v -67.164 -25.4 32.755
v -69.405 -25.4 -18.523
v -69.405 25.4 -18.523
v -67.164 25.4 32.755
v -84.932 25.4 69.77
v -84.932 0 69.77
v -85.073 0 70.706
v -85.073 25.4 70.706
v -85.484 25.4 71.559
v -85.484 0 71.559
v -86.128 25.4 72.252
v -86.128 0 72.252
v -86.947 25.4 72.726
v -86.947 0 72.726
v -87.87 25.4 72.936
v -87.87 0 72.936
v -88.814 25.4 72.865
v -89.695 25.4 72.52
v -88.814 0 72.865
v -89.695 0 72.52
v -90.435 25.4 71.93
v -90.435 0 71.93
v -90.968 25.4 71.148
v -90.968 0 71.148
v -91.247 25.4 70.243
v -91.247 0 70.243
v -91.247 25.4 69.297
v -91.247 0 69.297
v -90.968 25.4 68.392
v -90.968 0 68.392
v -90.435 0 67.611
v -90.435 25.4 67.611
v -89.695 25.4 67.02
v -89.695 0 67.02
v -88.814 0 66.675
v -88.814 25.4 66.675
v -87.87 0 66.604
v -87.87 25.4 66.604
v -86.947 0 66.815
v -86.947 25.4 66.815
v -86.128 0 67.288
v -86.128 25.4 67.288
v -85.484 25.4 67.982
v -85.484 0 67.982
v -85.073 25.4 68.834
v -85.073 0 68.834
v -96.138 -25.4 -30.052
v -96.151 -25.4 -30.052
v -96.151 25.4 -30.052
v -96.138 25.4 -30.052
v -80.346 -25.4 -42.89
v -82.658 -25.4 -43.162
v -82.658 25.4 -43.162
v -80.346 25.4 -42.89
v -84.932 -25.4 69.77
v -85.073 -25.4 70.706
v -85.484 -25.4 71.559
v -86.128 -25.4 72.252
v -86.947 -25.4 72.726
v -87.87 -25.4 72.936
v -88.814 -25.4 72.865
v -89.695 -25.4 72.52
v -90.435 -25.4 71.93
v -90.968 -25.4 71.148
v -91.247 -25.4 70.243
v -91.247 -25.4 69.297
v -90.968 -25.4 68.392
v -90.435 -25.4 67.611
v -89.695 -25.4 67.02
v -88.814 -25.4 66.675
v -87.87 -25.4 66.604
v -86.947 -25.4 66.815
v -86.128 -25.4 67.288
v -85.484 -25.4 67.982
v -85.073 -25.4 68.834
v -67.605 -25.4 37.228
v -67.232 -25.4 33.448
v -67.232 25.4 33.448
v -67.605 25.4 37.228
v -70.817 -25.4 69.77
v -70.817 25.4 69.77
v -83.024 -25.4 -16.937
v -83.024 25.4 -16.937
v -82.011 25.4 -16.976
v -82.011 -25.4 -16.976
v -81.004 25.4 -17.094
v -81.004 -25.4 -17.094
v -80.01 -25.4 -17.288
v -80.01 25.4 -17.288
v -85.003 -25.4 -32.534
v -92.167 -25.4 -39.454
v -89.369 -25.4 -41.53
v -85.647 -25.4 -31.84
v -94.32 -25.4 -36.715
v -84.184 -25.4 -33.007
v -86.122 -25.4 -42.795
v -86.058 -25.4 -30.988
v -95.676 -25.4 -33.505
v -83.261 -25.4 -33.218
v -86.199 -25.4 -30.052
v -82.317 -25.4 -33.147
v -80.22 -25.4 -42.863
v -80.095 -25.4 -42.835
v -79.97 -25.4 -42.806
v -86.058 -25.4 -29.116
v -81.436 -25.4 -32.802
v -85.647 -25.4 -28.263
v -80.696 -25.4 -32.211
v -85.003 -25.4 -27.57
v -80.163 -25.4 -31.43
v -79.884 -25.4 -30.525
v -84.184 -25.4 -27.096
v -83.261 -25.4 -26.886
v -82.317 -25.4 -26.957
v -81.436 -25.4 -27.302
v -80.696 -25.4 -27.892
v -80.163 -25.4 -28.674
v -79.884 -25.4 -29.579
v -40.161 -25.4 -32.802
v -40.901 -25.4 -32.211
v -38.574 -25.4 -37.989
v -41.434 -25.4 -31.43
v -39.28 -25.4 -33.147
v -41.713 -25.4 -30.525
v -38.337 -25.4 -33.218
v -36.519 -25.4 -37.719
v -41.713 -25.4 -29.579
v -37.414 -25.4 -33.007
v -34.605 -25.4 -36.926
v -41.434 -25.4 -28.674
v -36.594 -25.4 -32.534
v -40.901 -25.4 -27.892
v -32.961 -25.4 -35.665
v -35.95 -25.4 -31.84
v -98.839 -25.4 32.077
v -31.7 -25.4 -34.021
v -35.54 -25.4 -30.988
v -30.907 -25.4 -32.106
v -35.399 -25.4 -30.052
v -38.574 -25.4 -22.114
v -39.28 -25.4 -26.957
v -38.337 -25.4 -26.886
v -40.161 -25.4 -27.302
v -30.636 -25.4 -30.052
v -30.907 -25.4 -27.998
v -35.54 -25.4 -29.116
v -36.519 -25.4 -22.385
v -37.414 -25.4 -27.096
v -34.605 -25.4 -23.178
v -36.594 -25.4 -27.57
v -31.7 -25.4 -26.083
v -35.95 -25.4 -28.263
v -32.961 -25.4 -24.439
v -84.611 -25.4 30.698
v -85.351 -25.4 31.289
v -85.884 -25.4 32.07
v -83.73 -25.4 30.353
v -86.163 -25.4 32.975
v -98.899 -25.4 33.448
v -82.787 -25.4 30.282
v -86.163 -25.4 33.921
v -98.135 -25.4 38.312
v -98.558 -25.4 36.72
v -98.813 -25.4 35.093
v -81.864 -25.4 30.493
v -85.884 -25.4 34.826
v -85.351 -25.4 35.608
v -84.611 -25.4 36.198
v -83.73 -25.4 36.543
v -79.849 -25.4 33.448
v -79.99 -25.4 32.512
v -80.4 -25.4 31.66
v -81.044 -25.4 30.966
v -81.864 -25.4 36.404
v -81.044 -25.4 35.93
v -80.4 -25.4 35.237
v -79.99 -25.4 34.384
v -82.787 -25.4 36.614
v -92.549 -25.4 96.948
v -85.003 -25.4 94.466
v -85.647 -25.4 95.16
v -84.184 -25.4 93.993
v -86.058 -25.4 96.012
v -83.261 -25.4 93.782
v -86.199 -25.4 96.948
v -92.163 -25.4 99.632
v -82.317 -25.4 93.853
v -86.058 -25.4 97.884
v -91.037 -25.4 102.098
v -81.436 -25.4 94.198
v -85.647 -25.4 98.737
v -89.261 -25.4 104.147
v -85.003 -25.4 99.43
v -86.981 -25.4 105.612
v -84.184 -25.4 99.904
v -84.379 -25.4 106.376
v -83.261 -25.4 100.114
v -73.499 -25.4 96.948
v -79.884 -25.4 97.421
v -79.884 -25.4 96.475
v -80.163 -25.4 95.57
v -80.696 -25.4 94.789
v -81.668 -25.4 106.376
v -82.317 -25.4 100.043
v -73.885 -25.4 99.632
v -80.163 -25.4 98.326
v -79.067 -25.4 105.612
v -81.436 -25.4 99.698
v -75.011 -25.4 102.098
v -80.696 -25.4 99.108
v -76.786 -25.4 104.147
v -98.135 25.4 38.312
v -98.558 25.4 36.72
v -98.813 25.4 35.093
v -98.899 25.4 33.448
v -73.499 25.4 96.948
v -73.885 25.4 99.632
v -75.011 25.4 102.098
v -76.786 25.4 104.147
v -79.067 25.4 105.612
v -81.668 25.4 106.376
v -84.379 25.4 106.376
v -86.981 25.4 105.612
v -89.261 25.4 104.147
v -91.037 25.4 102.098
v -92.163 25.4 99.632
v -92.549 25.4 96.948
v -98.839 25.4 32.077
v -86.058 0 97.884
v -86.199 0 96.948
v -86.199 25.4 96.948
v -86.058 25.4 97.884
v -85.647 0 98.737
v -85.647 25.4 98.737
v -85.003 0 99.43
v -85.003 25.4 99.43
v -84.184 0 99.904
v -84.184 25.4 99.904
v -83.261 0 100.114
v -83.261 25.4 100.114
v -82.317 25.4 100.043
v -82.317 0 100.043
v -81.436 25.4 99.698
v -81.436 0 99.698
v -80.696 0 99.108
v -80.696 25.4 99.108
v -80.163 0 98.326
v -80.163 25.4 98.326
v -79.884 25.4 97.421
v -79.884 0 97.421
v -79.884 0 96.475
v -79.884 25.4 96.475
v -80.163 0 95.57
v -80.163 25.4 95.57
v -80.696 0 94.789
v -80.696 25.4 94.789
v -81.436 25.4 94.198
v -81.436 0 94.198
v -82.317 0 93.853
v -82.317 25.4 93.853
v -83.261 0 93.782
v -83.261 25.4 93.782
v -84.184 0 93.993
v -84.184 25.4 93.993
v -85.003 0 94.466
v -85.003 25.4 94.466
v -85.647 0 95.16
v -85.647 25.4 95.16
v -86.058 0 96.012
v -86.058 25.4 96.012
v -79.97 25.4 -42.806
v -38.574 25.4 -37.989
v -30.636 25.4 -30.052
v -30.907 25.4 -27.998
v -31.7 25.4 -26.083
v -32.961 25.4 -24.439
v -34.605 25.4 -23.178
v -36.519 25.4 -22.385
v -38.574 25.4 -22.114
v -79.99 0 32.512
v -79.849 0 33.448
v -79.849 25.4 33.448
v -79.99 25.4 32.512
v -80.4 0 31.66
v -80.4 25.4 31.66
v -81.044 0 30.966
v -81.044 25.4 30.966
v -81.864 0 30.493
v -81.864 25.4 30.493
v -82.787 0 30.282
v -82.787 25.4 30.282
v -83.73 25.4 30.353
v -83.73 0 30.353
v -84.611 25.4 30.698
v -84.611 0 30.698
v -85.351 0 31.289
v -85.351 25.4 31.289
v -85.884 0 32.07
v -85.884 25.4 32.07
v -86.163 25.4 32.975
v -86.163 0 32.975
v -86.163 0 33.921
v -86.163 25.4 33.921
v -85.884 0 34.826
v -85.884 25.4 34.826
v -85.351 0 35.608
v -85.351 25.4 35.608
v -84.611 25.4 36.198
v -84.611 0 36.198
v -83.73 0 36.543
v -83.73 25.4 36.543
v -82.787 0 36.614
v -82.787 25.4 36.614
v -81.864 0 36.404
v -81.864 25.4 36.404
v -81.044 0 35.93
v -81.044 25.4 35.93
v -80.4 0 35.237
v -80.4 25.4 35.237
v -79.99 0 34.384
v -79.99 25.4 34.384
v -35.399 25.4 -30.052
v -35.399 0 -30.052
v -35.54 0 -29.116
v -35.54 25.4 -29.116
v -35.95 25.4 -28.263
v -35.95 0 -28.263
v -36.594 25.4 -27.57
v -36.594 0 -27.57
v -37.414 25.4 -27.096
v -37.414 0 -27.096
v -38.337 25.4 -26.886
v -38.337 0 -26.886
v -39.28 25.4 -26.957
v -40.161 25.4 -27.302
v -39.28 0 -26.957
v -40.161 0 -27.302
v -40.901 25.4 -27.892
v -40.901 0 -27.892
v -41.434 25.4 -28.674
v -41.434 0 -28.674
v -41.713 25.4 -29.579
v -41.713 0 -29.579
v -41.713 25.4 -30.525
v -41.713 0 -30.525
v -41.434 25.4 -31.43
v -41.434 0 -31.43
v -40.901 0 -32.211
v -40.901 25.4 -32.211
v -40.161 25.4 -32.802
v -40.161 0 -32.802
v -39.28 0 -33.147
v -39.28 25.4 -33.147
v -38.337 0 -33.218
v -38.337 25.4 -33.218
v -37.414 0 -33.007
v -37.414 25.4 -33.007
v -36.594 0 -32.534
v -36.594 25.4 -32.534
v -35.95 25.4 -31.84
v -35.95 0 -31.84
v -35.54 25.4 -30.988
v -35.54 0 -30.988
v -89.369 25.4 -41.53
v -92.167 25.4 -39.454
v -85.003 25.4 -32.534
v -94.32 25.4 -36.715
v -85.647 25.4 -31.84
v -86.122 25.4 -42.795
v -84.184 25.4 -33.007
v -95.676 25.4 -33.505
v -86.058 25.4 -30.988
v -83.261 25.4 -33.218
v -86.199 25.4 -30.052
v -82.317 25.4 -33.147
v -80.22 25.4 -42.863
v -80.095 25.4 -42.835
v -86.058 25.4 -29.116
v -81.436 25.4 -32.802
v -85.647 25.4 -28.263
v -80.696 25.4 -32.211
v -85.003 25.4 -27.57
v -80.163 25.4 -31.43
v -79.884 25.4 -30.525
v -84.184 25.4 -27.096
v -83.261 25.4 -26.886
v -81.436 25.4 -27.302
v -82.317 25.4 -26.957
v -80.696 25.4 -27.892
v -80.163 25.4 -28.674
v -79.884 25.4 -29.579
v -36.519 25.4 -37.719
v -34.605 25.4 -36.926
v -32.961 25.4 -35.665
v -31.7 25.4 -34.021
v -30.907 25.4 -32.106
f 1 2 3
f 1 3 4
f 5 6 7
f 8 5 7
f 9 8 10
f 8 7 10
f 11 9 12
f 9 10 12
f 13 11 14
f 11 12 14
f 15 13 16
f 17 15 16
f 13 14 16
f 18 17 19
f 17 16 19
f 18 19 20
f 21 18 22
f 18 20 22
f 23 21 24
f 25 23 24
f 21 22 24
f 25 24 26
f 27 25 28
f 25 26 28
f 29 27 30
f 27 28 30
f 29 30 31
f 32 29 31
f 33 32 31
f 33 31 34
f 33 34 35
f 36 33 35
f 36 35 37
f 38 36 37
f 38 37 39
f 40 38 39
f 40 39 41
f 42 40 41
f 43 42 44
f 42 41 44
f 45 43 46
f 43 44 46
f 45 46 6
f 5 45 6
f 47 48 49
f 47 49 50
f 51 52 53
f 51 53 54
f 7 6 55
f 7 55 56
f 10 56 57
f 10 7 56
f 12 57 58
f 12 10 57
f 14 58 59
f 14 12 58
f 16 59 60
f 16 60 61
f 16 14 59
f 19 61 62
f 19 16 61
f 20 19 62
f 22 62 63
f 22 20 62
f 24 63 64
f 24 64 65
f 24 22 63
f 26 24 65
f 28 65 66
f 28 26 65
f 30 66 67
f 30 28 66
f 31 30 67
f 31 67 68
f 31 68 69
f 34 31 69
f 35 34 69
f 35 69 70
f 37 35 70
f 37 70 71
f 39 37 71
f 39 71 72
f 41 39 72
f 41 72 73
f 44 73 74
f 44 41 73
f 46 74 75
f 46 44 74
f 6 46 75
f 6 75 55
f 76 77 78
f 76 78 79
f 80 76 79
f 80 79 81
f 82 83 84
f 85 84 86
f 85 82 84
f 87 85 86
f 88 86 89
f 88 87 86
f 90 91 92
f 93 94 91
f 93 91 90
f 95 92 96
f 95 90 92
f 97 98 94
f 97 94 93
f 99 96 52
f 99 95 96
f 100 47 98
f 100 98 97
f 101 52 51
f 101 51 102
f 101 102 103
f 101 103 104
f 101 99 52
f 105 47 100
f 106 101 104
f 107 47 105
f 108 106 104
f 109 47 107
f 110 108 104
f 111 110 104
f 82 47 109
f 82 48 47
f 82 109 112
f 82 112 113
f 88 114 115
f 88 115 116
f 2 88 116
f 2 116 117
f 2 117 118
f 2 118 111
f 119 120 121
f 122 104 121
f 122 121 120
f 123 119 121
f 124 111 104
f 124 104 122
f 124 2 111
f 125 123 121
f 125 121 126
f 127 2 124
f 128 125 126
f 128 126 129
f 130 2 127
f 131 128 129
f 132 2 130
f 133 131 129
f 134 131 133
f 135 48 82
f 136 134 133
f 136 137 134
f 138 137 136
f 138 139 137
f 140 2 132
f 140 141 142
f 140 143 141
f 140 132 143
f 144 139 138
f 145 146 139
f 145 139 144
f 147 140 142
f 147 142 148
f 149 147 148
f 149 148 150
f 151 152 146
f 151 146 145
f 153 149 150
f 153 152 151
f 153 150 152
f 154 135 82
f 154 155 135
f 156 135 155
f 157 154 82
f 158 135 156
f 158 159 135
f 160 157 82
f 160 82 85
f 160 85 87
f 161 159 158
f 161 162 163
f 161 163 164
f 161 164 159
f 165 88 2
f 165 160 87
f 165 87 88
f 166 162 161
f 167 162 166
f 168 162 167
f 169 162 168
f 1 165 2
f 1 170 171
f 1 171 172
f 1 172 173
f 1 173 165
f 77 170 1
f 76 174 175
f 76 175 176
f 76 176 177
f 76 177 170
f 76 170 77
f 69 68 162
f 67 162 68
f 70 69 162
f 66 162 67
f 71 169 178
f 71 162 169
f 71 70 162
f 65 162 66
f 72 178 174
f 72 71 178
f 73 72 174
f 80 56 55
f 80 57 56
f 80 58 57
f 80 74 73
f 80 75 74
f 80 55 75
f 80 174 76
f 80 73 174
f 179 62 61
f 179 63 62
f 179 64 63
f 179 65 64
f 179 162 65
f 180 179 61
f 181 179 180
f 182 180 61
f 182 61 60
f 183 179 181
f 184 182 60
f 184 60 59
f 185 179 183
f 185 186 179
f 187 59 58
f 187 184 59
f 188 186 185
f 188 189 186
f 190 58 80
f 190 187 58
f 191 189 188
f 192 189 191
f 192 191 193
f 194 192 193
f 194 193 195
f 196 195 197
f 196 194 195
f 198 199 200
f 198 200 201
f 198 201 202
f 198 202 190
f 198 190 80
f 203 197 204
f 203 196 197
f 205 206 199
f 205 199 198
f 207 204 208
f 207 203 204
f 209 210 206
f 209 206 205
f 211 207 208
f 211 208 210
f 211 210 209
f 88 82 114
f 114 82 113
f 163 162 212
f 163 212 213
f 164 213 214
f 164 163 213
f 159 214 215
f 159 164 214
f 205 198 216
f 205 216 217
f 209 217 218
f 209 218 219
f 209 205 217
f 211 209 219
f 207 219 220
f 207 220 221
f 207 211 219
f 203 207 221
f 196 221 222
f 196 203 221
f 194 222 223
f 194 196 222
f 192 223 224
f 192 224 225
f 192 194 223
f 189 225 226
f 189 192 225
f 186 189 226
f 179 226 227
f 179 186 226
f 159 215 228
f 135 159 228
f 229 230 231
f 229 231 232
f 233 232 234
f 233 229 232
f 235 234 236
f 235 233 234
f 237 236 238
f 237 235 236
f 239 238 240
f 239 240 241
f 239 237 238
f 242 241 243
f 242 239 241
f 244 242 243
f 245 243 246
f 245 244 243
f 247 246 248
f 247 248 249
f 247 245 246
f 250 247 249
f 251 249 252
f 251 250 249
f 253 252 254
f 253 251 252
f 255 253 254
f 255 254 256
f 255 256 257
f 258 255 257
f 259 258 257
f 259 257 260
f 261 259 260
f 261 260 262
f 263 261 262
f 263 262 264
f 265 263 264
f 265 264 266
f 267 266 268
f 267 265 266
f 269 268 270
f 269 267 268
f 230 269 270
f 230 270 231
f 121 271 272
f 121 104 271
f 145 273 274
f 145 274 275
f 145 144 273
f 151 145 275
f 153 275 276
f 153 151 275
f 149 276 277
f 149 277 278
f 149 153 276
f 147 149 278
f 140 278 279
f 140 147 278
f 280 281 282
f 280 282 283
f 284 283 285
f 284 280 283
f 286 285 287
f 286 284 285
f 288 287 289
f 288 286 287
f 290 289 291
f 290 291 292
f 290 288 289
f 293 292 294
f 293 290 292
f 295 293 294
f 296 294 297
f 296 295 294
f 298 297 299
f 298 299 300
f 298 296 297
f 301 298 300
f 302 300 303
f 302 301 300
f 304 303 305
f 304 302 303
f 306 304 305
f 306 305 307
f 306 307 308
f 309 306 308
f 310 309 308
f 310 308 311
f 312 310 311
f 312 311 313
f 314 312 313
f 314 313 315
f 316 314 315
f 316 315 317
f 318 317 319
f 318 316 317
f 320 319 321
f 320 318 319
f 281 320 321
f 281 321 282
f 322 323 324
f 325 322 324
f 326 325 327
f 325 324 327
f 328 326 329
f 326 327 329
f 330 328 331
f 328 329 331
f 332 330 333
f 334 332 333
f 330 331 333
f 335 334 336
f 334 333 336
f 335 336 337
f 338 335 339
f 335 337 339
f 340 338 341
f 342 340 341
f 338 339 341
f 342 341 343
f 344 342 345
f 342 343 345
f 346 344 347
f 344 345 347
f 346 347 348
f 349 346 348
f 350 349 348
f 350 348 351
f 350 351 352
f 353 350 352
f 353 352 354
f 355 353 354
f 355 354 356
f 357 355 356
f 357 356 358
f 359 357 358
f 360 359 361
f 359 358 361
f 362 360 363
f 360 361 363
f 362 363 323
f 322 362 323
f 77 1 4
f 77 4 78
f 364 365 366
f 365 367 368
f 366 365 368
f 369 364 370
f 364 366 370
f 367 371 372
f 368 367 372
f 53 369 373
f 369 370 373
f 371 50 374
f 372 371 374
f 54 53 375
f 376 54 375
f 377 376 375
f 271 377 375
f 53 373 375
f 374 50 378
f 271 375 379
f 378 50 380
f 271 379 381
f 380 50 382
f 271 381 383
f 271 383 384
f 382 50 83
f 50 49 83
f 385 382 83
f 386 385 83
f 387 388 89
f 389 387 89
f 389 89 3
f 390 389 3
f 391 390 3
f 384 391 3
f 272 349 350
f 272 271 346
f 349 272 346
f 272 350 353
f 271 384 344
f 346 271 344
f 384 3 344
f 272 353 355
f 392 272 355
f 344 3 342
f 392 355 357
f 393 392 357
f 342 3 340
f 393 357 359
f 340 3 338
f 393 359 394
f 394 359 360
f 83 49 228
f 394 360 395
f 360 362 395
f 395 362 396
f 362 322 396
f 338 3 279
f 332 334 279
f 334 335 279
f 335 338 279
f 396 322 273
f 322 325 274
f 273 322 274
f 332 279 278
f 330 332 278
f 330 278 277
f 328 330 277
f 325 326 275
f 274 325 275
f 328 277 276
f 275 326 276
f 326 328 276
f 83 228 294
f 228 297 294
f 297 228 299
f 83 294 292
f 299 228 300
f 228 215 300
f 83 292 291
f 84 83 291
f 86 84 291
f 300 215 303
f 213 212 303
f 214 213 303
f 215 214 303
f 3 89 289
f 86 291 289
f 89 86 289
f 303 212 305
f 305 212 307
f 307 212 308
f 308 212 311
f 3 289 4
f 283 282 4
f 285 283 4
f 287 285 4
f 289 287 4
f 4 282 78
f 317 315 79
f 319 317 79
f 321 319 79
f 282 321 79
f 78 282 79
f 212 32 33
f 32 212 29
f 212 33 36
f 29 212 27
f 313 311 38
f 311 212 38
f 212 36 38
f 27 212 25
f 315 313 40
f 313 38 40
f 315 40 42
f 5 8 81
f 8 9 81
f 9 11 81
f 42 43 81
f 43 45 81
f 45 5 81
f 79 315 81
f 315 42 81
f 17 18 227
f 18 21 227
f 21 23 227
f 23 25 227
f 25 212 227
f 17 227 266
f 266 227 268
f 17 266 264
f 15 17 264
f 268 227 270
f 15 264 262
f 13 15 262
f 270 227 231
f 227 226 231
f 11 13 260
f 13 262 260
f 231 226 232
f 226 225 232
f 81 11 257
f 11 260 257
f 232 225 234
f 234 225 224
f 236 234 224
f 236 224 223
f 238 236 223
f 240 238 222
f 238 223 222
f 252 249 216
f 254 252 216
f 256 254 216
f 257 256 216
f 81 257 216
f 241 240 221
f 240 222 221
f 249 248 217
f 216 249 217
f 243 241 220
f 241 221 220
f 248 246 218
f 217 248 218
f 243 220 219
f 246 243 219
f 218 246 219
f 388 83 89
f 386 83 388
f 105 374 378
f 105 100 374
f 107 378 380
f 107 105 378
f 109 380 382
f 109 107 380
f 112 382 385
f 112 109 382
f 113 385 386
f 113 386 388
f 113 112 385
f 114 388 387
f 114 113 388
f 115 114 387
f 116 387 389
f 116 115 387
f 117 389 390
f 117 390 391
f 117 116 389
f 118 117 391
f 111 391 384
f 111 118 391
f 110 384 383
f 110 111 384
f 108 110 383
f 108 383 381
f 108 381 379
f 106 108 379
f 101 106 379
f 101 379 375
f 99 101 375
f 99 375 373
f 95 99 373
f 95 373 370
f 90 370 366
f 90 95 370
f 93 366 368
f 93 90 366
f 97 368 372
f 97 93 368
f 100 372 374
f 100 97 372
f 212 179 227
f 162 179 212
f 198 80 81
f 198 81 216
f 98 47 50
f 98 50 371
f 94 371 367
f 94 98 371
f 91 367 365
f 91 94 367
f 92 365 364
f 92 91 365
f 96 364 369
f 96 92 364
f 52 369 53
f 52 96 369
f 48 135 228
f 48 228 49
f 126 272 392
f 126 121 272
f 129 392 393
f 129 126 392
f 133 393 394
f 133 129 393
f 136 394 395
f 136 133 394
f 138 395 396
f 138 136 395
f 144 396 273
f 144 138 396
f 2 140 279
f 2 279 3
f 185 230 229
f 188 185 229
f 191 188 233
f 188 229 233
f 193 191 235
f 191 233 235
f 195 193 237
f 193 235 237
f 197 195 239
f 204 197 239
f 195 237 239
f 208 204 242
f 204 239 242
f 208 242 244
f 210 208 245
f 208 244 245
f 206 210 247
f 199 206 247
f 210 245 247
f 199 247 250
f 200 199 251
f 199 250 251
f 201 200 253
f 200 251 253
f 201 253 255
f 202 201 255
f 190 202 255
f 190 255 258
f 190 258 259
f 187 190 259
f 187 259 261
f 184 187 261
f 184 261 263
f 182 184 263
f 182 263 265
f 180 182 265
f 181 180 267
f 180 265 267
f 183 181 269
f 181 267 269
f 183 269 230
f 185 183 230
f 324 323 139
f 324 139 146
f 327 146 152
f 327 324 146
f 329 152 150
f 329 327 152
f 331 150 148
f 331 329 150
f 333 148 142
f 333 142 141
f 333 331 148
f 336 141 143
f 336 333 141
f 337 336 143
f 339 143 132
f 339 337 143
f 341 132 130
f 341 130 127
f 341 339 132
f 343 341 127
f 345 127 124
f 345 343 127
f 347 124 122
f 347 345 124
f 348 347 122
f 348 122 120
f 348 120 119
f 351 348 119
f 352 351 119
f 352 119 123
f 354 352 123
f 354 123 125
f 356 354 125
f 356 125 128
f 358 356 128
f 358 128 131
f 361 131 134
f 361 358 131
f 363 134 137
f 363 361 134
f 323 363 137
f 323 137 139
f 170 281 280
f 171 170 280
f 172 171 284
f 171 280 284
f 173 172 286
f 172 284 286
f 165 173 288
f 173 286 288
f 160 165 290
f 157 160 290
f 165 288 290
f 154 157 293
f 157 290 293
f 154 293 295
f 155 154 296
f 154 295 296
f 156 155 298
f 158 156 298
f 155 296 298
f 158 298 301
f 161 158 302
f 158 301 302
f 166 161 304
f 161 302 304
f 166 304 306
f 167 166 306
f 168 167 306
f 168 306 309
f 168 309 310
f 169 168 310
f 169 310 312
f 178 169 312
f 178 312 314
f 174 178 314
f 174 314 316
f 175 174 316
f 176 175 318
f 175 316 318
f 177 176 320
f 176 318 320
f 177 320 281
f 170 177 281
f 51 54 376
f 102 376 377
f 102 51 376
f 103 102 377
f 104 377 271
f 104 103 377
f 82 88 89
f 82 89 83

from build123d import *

# Parameters (mm, degrees)
F0_R     = 3.175
F1_DEPTH = 25.4


with BuildPart() as f1:
    # F0 (on Front) → F1 (new body, symmetric)
    with BuildSketch(Plane.XZ):
        with BuildLine():
            ThreePointArc((-98.135353981, 38.3118497444), (-82.4605407052, 49.3130634455), (-67.60536263, 37.2279420774))
            Line((-67.60536263, 37.2279420774), (-70.8167565395, 69.7700589479))
            Line((-70.8167565395, 69.7700589479), (-73.4987966791, 96.9480589479))
            ThreePointArc((-73.4987966791, 96.9480589479), (-83.0237966791, 87.4230589479), (-92.5487966791, 96.9480589479))
            Line((-92.5487966791, 96.9480589479), (-98.135353981, 38.3118497444))
        make_face()
        with Locations((-88.1071984768, 69.7700589479)):
            Circle(F0_R, mode=Mode.SUBTRACT)
        with BuildLine():
            ThreePointArc((-98.8394449745, 32.0766020597), (-82.6839530039, 17.5766969624), (-67.1639389713, 32.7548501134))
            Line((-67.1639389713, 32.7548501134), (-67.2323477549, 33.4480589479))
            Line((-67.2323477549, 33.4480589479), (-79.8487966791, 33.4480589479))
            ThreePointArc((-79.8487966791, 33.4480589479), (-83.0237966791, 30.2730589479), (-86.1987966791, 33.4480589479))
            Line((-86.1987966791, 33.4480589479), (-98.8987966791, 33.4480589479))
            Line((-98.8987966791, 33.4480589479), (-98.8394449745, 32.0766020597))
        make_face()
        with BuildLine():
            Line((-79.8487966791, 33.4480589479), (-67.2323477549, 33.4480589479))
            Line((-67.2323477549, 33.4480589479), (-67.60536263, 37.2279420774))
            ThreePointArc((-67.60536263, 37.2279420774), (-82.4605407052, 49.3130634455), (-98.135353981, 38.3118497444))
            ThreePointArc((-98.135353981, 38.3118497444), (-98.7067746675, 35.9097304159), (-98.8987966791, 33.4480589479))
            Line((-98.8987966791, 33.4480589479), (-86.1987966791, 33.4480589479))
            ThreePointArc((-86.1987966791, 33.4480589479), (-83.0237966791, 36.6230589479), (-79.8487966791, 33.4480589479))
        make_face()
        with BuildLine():
            ThreePointArc((-83.0237966791, -16.9372670215), (-81.5065627429, -17.025326906), (-80.0097040665, -17.2883239844))
            Line((-80.0097040665, -17.2883239844), (-69.4052307289, -18.5234466834))
            Line((-69.4052307289, -18.5234466834), (-67.1639389713, 32.7548501134))
            ThreePointArc((-67.1639389713, 32.7548501134), (-82.6839530039, 17.5766969624), (-98.8394449745, 32.0766020597))
            Line((-98.8394449745, 32.0766020597), (-96.1507458476, -30.0519410521))
            Line((-96.1507458476, -30.0519410521), (-96.1384707097, -30.0519410521))
            ThreePointArc((-96.1384707097, -30.0519410521), (-92.2972716192, -20.778466112), (-83.0237966791, -16.9372670215))
        make_face()
        with BuildLine():
            ThreePointArc((-73.4987966791, 96.9480589479), (-83.0237966791, 106.4730589479), (-92.5487966791, 96.9480589479))
            ThreePointArc((-92.5487966791, 96.9480589479), (-83.0237966791, 87.4230589479), (-73.4987966791, 96.9480589479))
        make_face()
        with BuildLine():
            ThreePointArc((-79.8487966791, 96.9480589479), (-83.0237966791, 93.7730589479), (-86.1987966791, 96.9480589479))
            ThreePointArc((-86.1987966791, 96.9480589479), (-83.0237966791, 100.1230589479), (-79.8487966791, 96.9480589479))
        make_face(mode=Mode.SUBTRACT)
        with BuildLine():
            ThreePointArc((-79.9704602907, -42.80622707), (-72.7272393329, -38.1744764779), (-69.9091226485, -30.0519410521))
            ThreePointArc((-69.9091226485, -30.0519410521), (-72.7397430756, -21.9135802584), (-80.0097040665, -17.2883239844))
            Line((-80.0097040665, -17.2883239844), (-83.0237966791, -16.9372670215))
            ThreePointArc((-83.0237966791, -16.9372670215), (-92.2972716192, -20.778466112), (-96.1384707097, -30.0519410521))
            ThreePointArc((-96.1384707097, -30.0519410521), (-92.1669135373, -39.4539668469), (-82.6576798276, -43.1615037214))
            Line((-82.6576798276, -43.1615037214), (-80.3456263931, -42.8902461913))
            ThreePointArc((-80.3456263931, -42.8902461913), (-80.1577354458, -42.8496114626), (-79.9704602907, -42.80622707))
        make_face()
        with BuildLine():
            ThreePointArc((-79.8487966791, -30.0519410521), (-83.0237966791, -33.2269410521), (-86.1987966791, -30.0519410521))
            ThreePointArc((-86.1987966791, -30.0519410521), (-83.0237966791, -26.8769410521), (-79.8487966791, -30.0519410521))
        make_face(mode=Mode.SUBTRACT)
        with BuildLine():
            Line((-69.4052307289, -18.5234466834), (-69.9091226485, -30.0519410521))
            ThreePointArc((-69.9091226485, -30.0519410521), (-72.7272393329, -38.1744764779), (-79.9704602907, -42.80622707))
            Line((-79.9704602907, -42.80622707), (-38.5737966791, -37.9894410521))
            ThreePointArc((-38.5737966791, -37.9894410521), (-46.5112966791, -30.0519410521), (-38.5737966791, -22.1144410521))
            Line((-38.5737966791, -22.1144410521), (-69.4052307289, -18.5234466834))
        make_face()
        with BuildLine():
            ThreePointArc((-38.5737966791, -22.1144410521), (-46.5112966791, -30.0519410521), (-38.5737966791, -37.9894410521))
            ThreePointArc((-38.5737966791, -37.9894410521), (-32.9611366035, -35.6646011277), (-30.6362966791, -30.0519410521))
            ThreePointArc((-30.6362966791, -30.0519410521), (-32.9611366035, -24.4392809764), (-38.5737966791, -22.1144410521))
        make_face()
        with Locations((-38.5737966791, -30.0519410521)):
            Circle(F0_R, mode=Mode.SUBTRACT)
        with BuildLine():
            ThreePointArc((-80.0097040665, -17.2883239844), (-72.7397430756, -21.9135802584), (-69.9091226485, -30.0519410521))
            Line((-69.9091226485, -30.0519410521), (-69.4052307289, -18.5234466834))
            Line((-69.4052307289, -18.5234466834), (-80.0097040665, -17.2883239844))
        make_face()
    extrude(amount=F1_DEPTH, both=True)


solid = f1.part
